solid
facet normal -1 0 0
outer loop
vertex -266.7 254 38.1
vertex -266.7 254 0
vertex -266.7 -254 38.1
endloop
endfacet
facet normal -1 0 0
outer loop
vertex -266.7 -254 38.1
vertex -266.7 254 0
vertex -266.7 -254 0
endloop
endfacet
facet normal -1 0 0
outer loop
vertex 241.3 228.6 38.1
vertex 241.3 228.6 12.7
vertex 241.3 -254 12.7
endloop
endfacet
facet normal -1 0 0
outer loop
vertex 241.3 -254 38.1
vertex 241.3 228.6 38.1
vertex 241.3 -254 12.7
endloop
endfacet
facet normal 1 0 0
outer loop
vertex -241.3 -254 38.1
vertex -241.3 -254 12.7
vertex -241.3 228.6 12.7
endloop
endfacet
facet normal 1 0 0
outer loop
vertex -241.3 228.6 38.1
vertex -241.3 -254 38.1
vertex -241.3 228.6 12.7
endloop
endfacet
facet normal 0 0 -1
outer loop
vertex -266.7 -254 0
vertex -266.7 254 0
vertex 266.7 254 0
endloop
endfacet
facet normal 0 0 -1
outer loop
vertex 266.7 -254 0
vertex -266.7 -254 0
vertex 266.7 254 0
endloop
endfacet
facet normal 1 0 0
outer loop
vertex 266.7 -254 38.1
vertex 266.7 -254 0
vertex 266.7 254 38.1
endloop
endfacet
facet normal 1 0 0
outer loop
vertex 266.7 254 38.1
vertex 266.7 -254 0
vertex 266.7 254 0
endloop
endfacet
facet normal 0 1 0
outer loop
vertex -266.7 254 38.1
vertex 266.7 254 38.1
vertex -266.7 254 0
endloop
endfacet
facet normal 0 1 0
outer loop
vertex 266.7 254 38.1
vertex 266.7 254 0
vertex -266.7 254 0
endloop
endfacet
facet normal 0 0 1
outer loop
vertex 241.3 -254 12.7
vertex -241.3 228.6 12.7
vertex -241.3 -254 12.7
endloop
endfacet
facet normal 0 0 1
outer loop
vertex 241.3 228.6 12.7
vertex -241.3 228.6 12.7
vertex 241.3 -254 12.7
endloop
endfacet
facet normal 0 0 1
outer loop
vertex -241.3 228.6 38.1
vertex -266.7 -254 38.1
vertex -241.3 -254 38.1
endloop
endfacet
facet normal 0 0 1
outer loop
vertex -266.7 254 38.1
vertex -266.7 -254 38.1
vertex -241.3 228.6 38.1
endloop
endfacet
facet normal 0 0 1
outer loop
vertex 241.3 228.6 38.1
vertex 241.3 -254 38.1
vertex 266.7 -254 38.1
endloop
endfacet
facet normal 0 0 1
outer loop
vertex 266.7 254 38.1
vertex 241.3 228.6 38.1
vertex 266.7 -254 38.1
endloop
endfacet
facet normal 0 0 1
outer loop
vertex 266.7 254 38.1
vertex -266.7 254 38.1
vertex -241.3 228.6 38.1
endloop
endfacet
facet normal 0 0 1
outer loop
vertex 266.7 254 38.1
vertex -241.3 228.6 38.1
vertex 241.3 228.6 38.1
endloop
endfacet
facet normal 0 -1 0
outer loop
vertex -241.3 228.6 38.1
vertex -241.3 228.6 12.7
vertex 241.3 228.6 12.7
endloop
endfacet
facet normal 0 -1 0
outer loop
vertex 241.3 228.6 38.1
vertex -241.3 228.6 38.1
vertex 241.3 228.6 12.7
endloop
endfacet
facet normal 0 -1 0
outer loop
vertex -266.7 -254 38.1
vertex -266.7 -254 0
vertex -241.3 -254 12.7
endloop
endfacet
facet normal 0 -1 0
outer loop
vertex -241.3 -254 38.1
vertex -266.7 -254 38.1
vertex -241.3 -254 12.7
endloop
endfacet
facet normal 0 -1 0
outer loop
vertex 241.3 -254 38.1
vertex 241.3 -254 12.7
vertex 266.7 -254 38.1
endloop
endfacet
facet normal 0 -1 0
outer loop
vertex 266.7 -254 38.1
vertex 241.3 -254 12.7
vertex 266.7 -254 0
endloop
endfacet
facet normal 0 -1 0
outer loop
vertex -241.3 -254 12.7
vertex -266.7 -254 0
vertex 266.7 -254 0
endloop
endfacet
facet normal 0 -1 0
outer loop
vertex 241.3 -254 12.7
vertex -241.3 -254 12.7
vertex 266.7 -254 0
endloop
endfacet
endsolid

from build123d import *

# Parameters (mm, degrees)
F1_DEPTH = 12.7
F2_W     = 482.6
F2_H     = 25.4
F3_DEPTH = 25.4


with BuildPart() as f1:
    # F0 (on Top) → F1 (new body)
    with BuildSketch(Plane.XY):
        Polygon((-241.3, 254), (-266.7, 254), (-266.7, -254), (266.7, -254), (266.7, 254), (241.3, 254), align=None)
    extrude(amount=F1_DEPTH)

    # F2 (on face) → F3 (join)
    with BuildSketch(Plane.XY.offset(12.7)):
        with Locations((0, 241.3)):
            Rectangle(F2_W, F2_H)
        Polygon((-241.3, 254), (-266.7, 254), (-266.7, -254), (-241.3, -254), (-241.3, 228.6), align=None)
        Polygon((266.7, 254), (241.3, 254), (241.3, 228.6), (241.3, -254), (266.7, -254), align=None)
    extrude(amount=F3_DEPTH)


solid = f1.part
